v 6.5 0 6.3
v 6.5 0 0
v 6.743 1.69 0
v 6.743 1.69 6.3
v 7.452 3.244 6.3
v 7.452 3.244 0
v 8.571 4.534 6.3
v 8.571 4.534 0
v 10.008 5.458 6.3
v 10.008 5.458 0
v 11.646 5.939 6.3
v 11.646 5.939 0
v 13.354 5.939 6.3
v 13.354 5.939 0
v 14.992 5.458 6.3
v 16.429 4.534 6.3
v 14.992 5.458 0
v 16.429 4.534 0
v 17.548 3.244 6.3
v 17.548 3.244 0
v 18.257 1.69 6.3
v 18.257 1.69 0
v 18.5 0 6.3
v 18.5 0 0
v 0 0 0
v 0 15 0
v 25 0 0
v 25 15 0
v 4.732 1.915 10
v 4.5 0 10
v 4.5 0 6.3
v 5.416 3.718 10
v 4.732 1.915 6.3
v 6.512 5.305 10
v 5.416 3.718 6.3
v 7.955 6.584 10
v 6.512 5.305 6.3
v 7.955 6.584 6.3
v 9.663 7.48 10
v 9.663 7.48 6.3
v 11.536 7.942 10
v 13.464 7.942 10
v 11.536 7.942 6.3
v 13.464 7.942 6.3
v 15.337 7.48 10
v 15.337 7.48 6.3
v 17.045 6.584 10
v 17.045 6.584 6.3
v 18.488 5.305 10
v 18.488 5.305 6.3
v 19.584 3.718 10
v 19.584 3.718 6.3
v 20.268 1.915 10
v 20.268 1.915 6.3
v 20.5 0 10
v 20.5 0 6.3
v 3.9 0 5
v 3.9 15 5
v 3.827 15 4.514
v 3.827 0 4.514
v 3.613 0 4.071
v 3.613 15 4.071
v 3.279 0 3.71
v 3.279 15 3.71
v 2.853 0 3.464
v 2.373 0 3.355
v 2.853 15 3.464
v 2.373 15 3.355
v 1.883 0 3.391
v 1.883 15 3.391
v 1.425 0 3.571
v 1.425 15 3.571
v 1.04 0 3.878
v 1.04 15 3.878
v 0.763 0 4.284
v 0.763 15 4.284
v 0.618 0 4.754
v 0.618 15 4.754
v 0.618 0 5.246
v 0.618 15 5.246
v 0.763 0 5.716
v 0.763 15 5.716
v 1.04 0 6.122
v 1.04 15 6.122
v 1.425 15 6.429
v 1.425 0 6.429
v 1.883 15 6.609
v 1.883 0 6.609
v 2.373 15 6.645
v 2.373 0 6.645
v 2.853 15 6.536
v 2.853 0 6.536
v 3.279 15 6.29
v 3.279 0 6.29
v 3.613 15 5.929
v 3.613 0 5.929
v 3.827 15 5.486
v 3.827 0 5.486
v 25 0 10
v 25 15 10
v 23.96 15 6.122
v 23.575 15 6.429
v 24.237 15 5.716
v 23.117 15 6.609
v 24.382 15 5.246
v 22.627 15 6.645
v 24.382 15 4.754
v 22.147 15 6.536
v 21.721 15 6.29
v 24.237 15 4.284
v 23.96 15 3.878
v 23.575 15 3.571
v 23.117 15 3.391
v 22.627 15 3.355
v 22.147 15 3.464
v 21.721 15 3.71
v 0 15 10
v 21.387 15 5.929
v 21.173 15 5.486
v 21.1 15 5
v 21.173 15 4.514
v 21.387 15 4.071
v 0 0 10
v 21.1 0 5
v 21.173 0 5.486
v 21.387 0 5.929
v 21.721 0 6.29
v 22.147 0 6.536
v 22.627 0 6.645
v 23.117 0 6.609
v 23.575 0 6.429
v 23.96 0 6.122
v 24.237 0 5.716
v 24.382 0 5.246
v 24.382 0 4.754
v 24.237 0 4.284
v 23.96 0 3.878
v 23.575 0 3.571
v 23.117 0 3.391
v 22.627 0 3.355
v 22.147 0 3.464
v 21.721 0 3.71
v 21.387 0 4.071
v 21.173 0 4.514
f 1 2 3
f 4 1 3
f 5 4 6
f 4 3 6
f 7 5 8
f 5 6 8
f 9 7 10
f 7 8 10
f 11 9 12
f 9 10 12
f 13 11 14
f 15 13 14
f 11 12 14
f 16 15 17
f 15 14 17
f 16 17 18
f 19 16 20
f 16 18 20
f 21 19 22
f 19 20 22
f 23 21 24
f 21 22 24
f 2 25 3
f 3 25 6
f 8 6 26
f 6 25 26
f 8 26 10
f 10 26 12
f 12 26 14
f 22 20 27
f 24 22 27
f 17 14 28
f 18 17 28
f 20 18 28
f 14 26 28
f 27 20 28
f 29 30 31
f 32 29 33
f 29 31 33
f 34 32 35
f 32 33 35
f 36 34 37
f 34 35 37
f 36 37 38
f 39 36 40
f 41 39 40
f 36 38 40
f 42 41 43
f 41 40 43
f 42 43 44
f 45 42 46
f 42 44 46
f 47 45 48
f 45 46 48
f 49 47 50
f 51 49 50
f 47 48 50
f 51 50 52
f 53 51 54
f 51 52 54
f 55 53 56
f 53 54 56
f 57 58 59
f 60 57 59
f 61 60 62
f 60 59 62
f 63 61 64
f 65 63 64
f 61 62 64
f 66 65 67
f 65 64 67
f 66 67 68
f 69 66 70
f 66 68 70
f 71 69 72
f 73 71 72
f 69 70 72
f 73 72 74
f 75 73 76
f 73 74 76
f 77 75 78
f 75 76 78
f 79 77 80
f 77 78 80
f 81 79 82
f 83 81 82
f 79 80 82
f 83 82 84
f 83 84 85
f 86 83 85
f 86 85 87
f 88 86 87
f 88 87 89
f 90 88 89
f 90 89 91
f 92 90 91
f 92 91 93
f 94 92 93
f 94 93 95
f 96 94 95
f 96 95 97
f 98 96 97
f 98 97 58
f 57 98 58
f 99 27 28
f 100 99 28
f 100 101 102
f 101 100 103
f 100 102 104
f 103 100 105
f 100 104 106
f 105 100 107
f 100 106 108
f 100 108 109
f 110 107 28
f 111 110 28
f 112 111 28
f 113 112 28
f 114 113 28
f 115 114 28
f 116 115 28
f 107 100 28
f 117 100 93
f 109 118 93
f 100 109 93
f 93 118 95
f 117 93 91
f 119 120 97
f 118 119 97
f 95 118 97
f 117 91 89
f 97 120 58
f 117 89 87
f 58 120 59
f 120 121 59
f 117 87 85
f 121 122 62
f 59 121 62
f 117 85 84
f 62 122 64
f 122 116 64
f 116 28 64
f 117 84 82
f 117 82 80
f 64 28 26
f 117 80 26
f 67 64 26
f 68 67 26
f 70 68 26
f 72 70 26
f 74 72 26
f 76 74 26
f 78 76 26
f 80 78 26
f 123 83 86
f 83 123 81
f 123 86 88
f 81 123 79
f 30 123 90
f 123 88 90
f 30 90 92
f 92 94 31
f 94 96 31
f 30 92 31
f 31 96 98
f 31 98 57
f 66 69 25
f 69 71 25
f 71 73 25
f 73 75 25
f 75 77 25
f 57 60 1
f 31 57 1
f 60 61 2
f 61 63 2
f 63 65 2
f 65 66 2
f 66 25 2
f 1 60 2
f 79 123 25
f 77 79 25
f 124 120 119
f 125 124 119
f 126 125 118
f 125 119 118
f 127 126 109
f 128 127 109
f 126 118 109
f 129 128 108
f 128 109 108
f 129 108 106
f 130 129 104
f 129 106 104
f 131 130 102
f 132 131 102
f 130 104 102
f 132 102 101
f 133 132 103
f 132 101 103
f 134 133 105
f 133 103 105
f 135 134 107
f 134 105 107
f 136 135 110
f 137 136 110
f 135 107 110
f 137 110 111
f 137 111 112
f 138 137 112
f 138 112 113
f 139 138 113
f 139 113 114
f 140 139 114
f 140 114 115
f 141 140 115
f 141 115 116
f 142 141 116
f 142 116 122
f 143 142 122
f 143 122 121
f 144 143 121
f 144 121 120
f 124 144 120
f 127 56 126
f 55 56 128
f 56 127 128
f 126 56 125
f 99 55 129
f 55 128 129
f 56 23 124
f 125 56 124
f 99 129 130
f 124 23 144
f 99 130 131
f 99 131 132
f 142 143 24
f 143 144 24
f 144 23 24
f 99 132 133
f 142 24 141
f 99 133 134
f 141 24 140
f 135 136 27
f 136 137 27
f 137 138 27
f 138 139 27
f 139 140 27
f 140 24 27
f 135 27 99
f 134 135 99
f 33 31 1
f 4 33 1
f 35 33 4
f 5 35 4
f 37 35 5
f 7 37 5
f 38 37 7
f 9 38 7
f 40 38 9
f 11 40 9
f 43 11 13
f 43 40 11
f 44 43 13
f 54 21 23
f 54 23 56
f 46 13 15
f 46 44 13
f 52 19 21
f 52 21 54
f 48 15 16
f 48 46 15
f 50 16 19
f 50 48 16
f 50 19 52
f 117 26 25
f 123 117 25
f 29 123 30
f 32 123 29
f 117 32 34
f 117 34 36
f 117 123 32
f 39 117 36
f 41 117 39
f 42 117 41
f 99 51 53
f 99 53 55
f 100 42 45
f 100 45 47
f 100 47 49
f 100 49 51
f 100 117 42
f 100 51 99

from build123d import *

# Parameters (mm, degrees)
F1_DEPTH = 10
F2_DEPTH = 6.3
F3_R     = 1.65
F4_DEPTH = 25


with BuildPart() as f1:
    # F0 (on Top) → F1 (new body)
    with BuildSketch(Plane.XY):
        with BuildLine():
            ThreePointArc((4.5, 0), (12.5, 8), (20.5, 0))
            Line((20.5, 0), (25, 0))
            Line((25, 0), (25, 15))
            Line((25, 15), (0, 15))
            Line((0, 15), (0, 0))
            Line((0, 0), (4.5, 0))
        make_face()
    extrude(amount=F1_DEPTH)

    # F0 (on Top) → F2 (join)
    with BuildSketch(Plane.XY):
        with BuildLine():
            ThreePointArc((6.5, 0), (12.5, 6), (18.5, 0))
            Line((18.5, 0), (20.5, 0))
            ThreePointArc((20.5, 0), (12.5, 8), (4.5, 0))
            Line((4.5, 0), (6.5, 0))
        make_face()
    extrude(amount=F2_DEPTH)

    # F3 (on face) → F4 (cut)
    with BuildSketch(Plane(origin=(0, 15, 0), x_dir=(-1, 0, 0), z_dir=(0, 1, 0))):
        with Locations((-22.75, 5)):
            Circle(F3_R)
        with BuildLine():
            ThreePointArc((-0.6, 5), (-2.25, 6.65), (-3.9, 5))
            ThreePointArc((-3.9, 5), (-2.25, 3.35), (-0.6, 5))
        make_face()
    extrude(amount=-F4_DEPTH, mode=Mode.SUBTRACT)


solid = f1.part
